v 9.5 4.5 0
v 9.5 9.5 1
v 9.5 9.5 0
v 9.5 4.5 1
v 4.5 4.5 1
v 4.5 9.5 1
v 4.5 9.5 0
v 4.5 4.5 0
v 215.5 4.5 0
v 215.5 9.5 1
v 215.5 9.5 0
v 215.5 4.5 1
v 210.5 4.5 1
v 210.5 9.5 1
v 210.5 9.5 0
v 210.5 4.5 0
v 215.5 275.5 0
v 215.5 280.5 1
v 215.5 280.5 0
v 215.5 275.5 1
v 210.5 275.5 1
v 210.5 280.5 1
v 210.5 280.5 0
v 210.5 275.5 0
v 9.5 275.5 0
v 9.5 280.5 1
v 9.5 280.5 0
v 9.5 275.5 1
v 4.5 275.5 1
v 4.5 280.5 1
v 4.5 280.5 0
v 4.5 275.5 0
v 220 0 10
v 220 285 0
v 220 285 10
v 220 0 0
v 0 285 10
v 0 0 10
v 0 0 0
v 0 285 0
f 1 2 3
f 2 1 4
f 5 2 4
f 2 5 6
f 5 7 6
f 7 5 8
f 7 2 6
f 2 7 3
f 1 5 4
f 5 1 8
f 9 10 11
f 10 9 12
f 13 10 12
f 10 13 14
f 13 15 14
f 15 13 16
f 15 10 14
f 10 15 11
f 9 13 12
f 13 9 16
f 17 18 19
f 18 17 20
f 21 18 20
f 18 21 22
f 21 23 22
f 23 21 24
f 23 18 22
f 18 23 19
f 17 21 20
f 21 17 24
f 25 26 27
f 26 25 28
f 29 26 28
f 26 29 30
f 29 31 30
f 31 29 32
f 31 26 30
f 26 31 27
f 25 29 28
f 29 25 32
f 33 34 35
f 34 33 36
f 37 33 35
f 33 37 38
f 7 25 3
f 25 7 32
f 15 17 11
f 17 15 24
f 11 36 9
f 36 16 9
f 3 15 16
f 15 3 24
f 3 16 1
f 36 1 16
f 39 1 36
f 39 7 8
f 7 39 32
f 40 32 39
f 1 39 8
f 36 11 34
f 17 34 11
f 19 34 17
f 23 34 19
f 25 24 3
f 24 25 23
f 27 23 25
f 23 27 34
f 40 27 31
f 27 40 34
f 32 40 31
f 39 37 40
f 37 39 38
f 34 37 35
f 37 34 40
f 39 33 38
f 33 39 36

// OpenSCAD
// All dimensions in millimeters. Origin: bottom-left of plate, viewed from above.
// Blank by default: add measured mount coordinates only after a physical fit check.
plate_width = 220;
plate_depth = 285;
plate_thickness = 10;
mounts = []; // [[x1,y1], [x2,y2], [x3,y3]]
shaft_clearance_diameter = 0; // REQUIRED measurement before adding mounts
head_recess_diameter = 5.5; // provisional: user's head estimate 5 mm + 0.5 mm total clearance
head_recess_depth = 5; // user's approximate measurement; confirm before cutting
// Paper-corner spring pockets in the plate underside. Values must match
// paper-corners/make_corner_caps.py (POCKET = 5.0, PLATE_INDENT = 1.0, inset = (CLEAR_IN + HALF) / 2 = 7.0).
spring_pockets = true;
spring_pocket_size = 5.0;
spring_pocket_depth = 1.0;
spring_pocket_inset = 7.0; // pocket centre distance from each plate edge
$fn = 96;
assert(plate_thickness > head_recess_depth);
assert(!spring_pockets || spring_pocket_depth < plate_thickness - 5);
assert(len(mounts) == 0 || shaft_clearance_diameter > 0,
       "Measure and set shaft_clearance_diameter before adding mount positions.");
assert(len(mounts) == 0 || head_recess_diameter > shaft_clearance_diameter);
for (p = mounts) {
    assert(p[0] > head_recess_diameter/2 && p[0] < plate_width-head_recess_diameter/2);
    assert(p[1] > head_recess_diameter/2 && p[1] < plate_depth-head_recess_diameter/2);
}
difference() {
    cube([plate_width, plate_depth, plate_thickness]);
    for (p = mounts) {
        translate([p[0],p[1],-0.1])
            cylinder(h=plate_thickness+0.2, d=shaft_clearance_diameter);
        translate([p[0],p[1],plate_thickness-head_recess_depth])
            cylinder(h=head_recess_depth+0.1, d=head_recess_diameter);
    }
    // Spring pockets cut from the plate BOTTOM at the four corners (z -0.1 .. spring_pocket_depth).
    if (spring_pockets)
        for (c = [[spring_pocket_inset, spring_pocket_inset],
                  [plate_width-spring_pocket_inset, spring_pocket_inset],
                  [plate_width-spring_pocket_inset, plate_depth-spring_pocket_inset],
                  [spring_pocket_inset, plate_depth-spring_pocket_inset]])
            translate([c[0]-spring_pocket_size/2, c[1]-spring_pocket_size/2, -0.1])
                cube([spring_pocket_size, spring_pocket_size, spring_pocket_depth+0.1]);
}
